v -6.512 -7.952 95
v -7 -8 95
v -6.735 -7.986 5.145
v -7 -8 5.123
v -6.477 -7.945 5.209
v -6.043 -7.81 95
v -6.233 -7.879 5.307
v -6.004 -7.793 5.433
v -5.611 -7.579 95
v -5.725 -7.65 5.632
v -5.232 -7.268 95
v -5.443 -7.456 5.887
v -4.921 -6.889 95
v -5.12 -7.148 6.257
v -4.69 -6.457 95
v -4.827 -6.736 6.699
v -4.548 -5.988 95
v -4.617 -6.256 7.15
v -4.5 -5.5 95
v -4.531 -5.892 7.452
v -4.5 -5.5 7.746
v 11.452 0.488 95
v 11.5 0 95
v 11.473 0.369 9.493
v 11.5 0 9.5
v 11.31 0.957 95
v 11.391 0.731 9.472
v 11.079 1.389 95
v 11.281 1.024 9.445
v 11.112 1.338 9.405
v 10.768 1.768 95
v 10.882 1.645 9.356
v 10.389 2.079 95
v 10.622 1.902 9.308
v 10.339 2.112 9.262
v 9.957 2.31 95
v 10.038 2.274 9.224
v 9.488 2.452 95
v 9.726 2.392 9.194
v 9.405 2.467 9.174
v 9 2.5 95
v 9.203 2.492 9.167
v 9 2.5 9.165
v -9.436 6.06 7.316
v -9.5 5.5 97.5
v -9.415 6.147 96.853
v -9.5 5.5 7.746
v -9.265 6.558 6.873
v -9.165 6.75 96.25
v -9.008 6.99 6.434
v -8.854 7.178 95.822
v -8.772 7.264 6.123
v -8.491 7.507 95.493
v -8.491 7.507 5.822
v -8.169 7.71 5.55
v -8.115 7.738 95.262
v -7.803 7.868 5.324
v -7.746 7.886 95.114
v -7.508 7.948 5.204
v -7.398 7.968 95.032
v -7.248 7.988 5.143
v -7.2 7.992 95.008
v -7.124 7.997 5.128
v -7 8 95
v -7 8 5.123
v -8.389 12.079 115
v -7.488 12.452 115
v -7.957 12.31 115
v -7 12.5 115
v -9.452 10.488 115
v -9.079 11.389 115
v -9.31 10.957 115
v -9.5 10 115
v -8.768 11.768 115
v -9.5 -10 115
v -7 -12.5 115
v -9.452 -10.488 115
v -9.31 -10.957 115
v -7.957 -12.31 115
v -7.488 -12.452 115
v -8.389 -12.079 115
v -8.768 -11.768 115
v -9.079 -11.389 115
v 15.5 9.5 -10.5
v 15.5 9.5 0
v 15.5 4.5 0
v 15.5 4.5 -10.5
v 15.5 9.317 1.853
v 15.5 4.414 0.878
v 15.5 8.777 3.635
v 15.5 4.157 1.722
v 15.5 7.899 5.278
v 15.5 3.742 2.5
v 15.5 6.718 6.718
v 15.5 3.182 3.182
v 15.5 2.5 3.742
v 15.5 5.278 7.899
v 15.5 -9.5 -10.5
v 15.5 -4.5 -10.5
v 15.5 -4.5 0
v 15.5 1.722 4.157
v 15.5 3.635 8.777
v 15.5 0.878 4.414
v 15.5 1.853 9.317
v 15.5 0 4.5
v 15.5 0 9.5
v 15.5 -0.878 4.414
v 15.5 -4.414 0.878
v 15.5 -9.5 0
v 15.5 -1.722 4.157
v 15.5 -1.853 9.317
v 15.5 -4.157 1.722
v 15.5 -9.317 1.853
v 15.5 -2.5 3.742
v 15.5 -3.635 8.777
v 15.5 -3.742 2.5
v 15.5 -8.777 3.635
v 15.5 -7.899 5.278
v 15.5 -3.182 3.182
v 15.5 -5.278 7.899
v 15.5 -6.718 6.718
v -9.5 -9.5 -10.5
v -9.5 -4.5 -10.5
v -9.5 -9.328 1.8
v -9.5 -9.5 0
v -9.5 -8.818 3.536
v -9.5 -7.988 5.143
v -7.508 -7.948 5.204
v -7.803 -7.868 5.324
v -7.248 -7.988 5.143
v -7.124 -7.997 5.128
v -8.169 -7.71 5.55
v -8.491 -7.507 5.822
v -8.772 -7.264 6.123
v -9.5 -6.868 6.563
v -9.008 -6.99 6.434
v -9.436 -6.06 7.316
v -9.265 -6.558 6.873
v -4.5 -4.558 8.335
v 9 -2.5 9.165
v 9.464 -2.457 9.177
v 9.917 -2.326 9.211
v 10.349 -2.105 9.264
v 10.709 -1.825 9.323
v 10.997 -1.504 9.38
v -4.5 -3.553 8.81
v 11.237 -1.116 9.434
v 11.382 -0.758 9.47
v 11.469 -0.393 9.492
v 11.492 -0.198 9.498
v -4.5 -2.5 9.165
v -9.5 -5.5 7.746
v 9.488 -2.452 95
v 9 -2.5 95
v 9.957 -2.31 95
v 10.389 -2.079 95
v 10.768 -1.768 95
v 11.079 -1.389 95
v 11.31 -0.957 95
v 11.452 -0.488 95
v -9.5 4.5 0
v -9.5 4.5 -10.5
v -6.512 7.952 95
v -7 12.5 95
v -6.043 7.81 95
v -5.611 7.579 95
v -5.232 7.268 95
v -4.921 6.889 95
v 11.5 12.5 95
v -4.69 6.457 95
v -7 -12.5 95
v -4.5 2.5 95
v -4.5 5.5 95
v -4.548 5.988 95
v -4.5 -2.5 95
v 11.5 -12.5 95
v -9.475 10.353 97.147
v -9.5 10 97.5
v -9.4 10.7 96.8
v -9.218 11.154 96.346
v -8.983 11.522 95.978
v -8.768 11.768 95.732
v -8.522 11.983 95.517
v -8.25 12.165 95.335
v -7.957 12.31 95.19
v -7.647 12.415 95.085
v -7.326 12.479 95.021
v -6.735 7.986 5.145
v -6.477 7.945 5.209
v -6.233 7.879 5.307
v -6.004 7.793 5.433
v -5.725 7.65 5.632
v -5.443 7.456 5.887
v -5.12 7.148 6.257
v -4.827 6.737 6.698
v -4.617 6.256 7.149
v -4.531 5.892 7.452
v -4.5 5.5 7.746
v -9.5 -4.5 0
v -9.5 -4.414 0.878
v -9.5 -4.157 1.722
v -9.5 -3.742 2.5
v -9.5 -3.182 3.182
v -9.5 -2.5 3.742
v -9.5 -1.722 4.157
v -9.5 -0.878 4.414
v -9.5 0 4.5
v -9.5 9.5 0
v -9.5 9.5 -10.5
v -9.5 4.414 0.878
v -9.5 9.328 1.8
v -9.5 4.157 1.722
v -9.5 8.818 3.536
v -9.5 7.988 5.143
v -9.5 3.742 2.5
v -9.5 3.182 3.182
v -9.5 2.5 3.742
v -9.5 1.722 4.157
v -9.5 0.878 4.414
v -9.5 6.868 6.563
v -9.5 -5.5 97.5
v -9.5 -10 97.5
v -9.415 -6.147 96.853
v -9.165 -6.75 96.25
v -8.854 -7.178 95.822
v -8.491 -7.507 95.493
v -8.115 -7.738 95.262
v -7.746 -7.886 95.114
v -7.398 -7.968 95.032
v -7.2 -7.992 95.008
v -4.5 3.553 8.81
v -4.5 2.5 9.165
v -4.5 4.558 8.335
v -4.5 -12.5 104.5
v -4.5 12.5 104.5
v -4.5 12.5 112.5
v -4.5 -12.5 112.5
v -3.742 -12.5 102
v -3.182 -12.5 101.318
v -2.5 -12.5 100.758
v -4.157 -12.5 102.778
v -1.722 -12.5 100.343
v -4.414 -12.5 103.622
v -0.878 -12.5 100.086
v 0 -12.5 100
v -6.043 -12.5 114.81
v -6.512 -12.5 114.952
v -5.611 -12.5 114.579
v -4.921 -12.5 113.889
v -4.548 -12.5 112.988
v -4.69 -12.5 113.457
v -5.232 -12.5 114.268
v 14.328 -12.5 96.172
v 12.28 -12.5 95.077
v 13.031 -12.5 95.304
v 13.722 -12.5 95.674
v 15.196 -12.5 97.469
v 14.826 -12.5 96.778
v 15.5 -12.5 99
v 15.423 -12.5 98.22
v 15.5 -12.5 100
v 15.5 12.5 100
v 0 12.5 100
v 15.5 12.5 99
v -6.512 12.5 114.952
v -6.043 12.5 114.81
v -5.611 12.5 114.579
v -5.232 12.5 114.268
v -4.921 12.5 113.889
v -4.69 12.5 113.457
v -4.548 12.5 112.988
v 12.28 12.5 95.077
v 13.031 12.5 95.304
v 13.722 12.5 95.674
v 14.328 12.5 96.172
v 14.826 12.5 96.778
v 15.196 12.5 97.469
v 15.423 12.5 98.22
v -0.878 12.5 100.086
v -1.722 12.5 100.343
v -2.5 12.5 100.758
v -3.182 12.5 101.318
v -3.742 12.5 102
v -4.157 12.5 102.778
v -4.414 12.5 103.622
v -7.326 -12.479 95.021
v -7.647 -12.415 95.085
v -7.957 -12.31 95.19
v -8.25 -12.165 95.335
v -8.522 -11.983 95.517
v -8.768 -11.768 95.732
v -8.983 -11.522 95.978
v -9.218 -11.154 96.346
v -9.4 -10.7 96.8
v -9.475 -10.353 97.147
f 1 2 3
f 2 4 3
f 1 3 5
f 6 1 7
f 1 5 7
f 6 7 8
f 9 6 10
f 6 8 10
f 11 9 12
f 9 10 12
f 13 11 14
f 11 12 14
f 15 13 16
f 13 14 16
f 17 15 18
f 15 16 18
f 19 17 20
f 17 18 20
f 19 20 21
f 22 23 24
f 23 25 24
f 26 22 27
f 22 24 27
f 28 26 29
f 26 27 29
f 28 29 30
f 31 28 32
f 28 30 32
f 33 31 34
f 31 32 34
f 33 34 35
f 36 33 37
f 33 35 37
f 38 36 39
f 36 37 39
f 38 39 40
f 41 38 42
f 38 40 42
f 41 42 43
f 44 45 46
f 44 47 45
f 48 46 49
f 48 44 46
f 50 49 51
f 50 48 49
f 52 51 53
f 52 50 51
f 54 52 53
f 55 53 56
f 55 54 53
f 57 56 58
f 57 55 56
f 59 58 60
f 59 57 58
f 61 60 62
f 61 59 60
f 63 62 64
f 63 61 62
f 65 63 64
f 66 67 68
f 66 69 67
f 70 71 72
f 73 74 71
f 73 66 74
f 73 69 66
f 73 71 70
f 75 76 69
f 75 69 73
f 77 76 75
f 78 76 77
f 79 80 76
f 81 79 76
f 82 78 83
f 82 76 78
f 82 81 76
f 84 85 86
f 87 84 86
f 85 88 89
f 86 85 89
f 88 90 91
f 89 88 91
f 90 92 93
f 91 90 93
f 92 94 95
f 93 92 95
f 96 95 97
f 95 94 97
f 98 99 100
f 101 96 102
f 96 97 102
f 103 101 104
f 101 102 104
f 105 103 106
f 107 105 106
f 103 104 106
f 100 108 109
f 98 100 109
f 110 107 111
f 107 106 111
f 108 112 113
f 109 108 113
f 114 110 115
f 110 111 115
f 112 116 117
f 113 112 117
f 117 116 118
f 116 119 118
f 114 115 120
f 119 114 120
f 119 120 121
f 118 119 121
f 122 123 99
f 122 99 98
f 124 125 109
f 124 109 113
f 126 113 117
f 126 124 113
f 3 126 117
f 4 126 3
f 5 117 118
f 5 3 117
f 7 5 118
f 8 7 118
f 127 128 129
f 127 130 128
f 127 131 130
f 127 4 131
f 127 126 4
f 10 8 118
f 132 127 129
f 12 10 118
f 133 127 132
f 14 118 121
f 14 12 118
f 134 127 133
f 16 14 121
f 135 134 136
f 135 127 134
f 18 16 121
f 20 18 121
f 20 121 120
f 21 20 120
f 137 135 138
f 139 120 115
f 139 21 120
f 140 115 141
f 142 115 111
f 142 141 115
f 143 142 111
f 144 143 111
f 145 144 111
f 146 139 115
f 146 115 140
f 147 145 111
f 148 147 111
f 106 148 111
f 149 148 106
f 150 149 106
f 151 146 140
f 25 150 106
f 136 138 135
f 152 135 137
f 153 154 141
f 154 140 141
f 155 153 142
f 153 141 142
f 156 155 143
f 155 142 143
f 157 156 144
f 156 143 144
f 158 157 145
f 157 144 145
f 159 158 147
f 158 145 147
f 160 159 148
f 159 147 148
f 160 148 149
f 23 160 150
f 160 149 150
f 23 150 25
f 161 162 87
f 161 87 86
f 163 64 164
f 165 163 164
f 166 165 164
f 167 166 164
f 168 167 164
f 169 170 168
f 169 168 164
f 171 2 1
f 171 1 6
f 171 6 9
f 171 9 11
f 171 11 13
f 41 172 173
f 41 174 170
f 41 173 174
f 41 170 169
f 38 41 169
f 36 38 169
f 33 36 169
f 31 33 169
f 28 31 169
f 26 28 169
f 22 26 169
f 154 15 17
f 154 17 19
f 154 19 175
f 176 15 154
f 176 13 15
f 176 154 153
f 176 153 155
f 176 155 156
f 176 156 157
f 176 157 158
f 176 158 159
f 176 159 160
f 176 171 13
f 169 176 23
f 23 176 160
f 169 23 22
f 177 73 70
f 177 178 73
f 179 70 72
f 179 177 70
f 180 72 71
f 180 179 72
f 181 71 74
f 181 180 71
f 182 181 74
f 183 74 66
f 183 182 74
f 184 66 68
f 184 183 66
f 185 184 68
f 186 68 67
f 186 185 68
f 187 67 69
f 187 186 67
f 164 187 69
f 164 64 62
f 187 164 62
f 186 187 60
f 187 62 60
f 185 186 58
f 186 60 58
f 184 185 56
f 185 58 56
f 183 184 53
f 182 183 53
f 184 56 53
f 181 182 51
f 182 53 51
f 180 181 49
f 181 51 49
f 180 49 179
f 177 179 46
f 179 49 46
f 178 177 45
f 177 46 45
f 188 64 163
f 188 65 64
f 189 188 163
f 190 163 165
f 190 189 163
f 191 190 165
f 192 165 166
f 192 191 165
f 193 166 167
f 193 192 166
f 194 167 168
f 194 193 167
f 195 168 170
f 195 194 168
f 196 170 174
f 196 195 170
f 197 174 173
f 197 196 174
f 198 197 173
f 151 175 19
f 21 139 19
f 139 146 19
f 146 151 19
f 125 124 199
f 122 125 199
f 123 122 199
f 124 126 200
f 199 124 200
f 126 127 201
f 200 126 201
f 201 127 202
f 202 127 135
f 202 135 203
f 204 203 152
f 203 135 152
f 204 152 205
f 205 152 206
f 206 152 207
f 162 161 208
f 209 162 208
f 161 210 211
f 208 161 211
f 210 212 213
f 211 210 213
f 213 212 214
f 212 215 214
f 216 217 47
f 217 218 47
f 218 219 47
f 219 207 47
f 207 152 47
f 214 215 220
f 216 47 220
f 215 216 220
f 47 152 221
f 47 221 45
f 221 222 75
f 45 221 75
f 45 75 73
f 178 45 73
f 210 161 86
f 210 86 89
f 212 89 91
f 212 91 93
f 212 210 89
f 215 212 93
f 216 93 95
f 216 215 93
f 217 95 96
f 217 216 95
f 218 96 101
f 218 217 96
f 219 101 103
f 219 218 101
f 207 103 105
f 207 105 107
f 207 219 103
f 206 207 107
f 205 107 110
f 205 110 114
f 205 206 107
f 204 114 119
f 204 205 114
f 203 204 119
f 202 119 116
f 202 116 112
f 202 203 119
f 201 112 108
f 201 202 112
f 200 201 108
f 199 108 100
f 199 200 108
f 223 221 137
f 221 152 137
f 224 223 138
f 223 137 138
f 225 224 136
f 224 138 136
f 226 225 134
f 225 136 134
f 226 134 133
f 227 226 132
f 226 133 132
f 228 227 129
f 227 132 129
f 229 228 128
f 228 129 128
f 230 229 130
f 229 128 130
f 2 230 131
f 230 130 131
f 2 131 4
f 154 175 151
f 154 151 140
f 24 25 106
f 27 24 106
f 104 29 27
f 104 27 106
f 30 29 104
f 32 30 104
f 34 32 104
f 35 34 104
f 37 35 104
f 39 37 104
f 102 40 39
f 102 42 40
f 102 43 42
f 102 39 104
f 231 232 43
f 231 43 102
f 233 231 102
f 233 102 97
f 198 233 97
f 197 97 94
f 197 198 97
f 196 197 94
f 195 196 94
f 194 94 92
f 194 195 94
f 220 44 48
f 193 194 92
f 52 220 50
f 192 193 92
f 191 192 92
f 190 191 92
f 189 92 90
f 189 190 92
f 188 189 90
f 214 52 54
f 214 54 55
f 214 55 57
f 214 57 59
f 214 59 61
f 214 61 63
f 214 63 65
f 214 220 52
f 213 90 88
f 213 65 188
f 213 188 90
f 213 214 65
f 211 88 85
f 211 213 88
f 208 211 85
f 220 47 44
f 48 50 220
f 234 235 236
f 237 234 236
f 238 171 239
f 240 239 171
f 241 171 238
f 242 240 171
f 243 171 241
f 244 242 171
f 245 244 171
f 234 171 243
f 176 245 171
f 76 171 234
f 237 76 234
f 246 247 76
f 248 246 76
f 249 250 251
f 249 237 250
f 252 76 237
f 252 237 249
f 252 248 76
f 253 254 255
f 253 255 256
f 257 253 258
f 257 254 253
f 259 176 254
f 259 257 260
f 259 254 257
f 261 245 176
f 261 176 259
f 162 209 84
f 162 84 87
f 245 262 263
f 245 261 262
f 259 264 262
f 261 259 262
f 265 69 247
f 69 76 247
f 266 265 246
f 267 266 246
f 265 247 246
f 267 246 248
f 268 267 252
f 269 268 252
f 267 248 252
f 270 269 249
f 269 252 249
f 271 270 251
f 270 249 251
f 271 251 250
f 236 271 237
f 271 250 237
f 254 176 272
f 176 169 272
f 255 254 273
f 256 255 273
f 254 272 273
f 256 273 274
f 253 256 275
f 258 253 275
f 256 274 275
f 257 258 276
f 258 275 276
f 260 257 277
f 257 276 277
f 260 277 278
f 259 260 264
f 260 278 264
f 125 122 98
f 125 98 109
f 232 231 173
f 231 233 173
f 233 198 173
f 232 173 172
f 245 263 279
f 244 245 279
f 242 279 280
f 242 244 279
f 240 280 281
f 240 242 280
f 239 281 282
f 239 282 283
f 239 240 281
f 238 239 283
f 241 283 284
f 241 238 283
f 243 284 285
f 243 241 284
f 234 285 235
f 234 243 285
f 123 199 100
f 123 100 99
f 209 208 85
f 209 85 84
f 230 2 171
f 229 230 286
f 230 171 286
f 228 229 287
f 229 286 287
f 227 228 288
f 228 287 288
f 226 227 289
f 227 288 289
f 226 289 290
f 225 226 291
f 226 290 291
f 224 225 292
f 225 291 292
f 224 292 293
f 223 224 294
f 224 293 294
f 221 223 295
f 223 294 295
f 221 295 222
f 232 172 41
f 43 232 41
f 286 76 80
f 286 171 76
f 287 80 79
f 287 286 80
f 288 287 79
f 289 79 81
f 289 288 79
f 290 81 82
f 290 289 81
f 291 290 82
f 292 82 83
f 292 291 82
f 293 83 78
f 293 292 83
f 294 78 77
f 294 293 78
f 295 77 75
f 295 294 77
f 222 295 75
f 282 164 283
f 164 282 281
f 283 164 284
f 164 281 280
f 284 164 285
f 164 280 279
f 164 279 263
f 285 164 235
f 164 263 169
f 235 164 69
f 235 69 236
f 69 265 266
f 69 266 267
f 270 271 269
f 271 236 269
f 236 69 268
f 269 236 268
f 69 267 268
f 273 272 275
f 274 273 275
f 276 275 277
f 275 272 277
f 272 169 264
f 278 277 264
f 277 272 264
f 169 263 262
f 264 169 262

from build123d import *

# Parameters (mm, degrees)
F1_DEPTH = 12.5
F3_DEPTH = 25
F4_W     = 16
F4_H     = 5
F5_DEPTH = 89.876524617
F6_R     = 3.99999
F7_R     = 2.4999


# Not quite as in the source:
# - a fillet or chamfer is up to 0.001 mm smaller than in the source, because OpenCascade refuses the exact size


with BuildPart() as f1:
    # F0 (on Front) → F1 (new body, symmetric)
    with BuildSketch(Plane.XZ):
        with BuildLine():
            ThreePointArc((0, 100), (-3.1819805153, 101.3180194847), (-4.5, 104.5))
            Line((-4.5, 104.5), (-4.5, 115))
            Line((-4.5, 115), (-9.5, 115))
            Line((-9.5, 115), (-9.5, 95))
            Line((-9.5, 95), (15.5, 95))
            Line((15.5, 95), (15.5, 100))
            Line((15.5, 100), (0, 100))
        make_face()
    extrude(amount=F1_DEPTH, both=True)



with BuildPart() as f3:
    # F2 (on face) → F3 (new body)
    with BuildSketch(Plane(origin=(-9.5, 0, 0), x_dir=(0, -1, 0), z_dir=(-1, 0, 0))):
        with BuildLine():
            ThreePointArc((-4.5, 0), (0, 4.5), (4.5, 0))
            Line((4.5, 0), (4.5, -10.5))
            Line((4.5, -10.5), (9.5, -10.5))
            Line((9.5, -10.5), (9.5, 0))
            ThreePointArc((9.5, 0), (6.7175144213, 6.7175144213), (0, 9.5))
            ThreePointArc((0, 9.5), (-6.7175144213, 6.7175144213), (-9.5, 0))
            Line((-9.5, 0), (-9.5, -10.5))
            Line((-9.5, -10.5), (-4.5, -10.5))
            Line((-4.5, -10.5), (-4.5, 0))
        make_face()
    extrude(amount=-F3_DEPTH)


with BuildPart() as f1_1:
    add(f1.part)

    add(f3.part)  # F5 merges F3
    # F4 (on face) → F5 (join, through all)
    with BuildSketch(Plane(origin=(0, 0, 95), x_dir=(1, 0, 0), z_dir=(0, 0, -1))):
        Polygon((-4.5, 8), (-9.5, 8), (-9.5, -8), (-4.5, -8), (-4.5, -2.5), (-4.5, 2.5), align=None)
        with Locations((3.5, 0)):
            Rectangle(F4_W, F4_H)
    extrude(amount=F5_DEPTH)

    # F6 (radius 4 in the source; OpenCascade refuses exactly that, so slightly less here)
    f6_edges = [f1_1.edges().sort_by_distance(p)[0] for p in [
        (15.5, 0, 95),
    ]]
    fillet(f6_edges, radius=F6_R)

    # F7 (radius 2.5 in the source; OpenCascade refuses exactly that, so slightly less here)
    f7_edges = [f1_1.edges().sort_by_distance(p)[0] for p in [
        (11.5, -2.5, 52.082576),
        (11.5, 2.5, 52.082576),
        (-4.5, -8, 50.061738),
        (-4.5, 8, 50.061738),
        (-9.5, 8, 50.061738),
        (-9.5, -8, 50.061738),
        (-9.5, -10.25, 95),
        (-9.5, 10.25, 95),
        (-9.5, -12.5, 105),
        (-9.5, 12.5, 105),
        (-4.5, 0, 115),
    ]]
    fillet(f7_edges, radius=F7_R)


solid = f1_1.part
